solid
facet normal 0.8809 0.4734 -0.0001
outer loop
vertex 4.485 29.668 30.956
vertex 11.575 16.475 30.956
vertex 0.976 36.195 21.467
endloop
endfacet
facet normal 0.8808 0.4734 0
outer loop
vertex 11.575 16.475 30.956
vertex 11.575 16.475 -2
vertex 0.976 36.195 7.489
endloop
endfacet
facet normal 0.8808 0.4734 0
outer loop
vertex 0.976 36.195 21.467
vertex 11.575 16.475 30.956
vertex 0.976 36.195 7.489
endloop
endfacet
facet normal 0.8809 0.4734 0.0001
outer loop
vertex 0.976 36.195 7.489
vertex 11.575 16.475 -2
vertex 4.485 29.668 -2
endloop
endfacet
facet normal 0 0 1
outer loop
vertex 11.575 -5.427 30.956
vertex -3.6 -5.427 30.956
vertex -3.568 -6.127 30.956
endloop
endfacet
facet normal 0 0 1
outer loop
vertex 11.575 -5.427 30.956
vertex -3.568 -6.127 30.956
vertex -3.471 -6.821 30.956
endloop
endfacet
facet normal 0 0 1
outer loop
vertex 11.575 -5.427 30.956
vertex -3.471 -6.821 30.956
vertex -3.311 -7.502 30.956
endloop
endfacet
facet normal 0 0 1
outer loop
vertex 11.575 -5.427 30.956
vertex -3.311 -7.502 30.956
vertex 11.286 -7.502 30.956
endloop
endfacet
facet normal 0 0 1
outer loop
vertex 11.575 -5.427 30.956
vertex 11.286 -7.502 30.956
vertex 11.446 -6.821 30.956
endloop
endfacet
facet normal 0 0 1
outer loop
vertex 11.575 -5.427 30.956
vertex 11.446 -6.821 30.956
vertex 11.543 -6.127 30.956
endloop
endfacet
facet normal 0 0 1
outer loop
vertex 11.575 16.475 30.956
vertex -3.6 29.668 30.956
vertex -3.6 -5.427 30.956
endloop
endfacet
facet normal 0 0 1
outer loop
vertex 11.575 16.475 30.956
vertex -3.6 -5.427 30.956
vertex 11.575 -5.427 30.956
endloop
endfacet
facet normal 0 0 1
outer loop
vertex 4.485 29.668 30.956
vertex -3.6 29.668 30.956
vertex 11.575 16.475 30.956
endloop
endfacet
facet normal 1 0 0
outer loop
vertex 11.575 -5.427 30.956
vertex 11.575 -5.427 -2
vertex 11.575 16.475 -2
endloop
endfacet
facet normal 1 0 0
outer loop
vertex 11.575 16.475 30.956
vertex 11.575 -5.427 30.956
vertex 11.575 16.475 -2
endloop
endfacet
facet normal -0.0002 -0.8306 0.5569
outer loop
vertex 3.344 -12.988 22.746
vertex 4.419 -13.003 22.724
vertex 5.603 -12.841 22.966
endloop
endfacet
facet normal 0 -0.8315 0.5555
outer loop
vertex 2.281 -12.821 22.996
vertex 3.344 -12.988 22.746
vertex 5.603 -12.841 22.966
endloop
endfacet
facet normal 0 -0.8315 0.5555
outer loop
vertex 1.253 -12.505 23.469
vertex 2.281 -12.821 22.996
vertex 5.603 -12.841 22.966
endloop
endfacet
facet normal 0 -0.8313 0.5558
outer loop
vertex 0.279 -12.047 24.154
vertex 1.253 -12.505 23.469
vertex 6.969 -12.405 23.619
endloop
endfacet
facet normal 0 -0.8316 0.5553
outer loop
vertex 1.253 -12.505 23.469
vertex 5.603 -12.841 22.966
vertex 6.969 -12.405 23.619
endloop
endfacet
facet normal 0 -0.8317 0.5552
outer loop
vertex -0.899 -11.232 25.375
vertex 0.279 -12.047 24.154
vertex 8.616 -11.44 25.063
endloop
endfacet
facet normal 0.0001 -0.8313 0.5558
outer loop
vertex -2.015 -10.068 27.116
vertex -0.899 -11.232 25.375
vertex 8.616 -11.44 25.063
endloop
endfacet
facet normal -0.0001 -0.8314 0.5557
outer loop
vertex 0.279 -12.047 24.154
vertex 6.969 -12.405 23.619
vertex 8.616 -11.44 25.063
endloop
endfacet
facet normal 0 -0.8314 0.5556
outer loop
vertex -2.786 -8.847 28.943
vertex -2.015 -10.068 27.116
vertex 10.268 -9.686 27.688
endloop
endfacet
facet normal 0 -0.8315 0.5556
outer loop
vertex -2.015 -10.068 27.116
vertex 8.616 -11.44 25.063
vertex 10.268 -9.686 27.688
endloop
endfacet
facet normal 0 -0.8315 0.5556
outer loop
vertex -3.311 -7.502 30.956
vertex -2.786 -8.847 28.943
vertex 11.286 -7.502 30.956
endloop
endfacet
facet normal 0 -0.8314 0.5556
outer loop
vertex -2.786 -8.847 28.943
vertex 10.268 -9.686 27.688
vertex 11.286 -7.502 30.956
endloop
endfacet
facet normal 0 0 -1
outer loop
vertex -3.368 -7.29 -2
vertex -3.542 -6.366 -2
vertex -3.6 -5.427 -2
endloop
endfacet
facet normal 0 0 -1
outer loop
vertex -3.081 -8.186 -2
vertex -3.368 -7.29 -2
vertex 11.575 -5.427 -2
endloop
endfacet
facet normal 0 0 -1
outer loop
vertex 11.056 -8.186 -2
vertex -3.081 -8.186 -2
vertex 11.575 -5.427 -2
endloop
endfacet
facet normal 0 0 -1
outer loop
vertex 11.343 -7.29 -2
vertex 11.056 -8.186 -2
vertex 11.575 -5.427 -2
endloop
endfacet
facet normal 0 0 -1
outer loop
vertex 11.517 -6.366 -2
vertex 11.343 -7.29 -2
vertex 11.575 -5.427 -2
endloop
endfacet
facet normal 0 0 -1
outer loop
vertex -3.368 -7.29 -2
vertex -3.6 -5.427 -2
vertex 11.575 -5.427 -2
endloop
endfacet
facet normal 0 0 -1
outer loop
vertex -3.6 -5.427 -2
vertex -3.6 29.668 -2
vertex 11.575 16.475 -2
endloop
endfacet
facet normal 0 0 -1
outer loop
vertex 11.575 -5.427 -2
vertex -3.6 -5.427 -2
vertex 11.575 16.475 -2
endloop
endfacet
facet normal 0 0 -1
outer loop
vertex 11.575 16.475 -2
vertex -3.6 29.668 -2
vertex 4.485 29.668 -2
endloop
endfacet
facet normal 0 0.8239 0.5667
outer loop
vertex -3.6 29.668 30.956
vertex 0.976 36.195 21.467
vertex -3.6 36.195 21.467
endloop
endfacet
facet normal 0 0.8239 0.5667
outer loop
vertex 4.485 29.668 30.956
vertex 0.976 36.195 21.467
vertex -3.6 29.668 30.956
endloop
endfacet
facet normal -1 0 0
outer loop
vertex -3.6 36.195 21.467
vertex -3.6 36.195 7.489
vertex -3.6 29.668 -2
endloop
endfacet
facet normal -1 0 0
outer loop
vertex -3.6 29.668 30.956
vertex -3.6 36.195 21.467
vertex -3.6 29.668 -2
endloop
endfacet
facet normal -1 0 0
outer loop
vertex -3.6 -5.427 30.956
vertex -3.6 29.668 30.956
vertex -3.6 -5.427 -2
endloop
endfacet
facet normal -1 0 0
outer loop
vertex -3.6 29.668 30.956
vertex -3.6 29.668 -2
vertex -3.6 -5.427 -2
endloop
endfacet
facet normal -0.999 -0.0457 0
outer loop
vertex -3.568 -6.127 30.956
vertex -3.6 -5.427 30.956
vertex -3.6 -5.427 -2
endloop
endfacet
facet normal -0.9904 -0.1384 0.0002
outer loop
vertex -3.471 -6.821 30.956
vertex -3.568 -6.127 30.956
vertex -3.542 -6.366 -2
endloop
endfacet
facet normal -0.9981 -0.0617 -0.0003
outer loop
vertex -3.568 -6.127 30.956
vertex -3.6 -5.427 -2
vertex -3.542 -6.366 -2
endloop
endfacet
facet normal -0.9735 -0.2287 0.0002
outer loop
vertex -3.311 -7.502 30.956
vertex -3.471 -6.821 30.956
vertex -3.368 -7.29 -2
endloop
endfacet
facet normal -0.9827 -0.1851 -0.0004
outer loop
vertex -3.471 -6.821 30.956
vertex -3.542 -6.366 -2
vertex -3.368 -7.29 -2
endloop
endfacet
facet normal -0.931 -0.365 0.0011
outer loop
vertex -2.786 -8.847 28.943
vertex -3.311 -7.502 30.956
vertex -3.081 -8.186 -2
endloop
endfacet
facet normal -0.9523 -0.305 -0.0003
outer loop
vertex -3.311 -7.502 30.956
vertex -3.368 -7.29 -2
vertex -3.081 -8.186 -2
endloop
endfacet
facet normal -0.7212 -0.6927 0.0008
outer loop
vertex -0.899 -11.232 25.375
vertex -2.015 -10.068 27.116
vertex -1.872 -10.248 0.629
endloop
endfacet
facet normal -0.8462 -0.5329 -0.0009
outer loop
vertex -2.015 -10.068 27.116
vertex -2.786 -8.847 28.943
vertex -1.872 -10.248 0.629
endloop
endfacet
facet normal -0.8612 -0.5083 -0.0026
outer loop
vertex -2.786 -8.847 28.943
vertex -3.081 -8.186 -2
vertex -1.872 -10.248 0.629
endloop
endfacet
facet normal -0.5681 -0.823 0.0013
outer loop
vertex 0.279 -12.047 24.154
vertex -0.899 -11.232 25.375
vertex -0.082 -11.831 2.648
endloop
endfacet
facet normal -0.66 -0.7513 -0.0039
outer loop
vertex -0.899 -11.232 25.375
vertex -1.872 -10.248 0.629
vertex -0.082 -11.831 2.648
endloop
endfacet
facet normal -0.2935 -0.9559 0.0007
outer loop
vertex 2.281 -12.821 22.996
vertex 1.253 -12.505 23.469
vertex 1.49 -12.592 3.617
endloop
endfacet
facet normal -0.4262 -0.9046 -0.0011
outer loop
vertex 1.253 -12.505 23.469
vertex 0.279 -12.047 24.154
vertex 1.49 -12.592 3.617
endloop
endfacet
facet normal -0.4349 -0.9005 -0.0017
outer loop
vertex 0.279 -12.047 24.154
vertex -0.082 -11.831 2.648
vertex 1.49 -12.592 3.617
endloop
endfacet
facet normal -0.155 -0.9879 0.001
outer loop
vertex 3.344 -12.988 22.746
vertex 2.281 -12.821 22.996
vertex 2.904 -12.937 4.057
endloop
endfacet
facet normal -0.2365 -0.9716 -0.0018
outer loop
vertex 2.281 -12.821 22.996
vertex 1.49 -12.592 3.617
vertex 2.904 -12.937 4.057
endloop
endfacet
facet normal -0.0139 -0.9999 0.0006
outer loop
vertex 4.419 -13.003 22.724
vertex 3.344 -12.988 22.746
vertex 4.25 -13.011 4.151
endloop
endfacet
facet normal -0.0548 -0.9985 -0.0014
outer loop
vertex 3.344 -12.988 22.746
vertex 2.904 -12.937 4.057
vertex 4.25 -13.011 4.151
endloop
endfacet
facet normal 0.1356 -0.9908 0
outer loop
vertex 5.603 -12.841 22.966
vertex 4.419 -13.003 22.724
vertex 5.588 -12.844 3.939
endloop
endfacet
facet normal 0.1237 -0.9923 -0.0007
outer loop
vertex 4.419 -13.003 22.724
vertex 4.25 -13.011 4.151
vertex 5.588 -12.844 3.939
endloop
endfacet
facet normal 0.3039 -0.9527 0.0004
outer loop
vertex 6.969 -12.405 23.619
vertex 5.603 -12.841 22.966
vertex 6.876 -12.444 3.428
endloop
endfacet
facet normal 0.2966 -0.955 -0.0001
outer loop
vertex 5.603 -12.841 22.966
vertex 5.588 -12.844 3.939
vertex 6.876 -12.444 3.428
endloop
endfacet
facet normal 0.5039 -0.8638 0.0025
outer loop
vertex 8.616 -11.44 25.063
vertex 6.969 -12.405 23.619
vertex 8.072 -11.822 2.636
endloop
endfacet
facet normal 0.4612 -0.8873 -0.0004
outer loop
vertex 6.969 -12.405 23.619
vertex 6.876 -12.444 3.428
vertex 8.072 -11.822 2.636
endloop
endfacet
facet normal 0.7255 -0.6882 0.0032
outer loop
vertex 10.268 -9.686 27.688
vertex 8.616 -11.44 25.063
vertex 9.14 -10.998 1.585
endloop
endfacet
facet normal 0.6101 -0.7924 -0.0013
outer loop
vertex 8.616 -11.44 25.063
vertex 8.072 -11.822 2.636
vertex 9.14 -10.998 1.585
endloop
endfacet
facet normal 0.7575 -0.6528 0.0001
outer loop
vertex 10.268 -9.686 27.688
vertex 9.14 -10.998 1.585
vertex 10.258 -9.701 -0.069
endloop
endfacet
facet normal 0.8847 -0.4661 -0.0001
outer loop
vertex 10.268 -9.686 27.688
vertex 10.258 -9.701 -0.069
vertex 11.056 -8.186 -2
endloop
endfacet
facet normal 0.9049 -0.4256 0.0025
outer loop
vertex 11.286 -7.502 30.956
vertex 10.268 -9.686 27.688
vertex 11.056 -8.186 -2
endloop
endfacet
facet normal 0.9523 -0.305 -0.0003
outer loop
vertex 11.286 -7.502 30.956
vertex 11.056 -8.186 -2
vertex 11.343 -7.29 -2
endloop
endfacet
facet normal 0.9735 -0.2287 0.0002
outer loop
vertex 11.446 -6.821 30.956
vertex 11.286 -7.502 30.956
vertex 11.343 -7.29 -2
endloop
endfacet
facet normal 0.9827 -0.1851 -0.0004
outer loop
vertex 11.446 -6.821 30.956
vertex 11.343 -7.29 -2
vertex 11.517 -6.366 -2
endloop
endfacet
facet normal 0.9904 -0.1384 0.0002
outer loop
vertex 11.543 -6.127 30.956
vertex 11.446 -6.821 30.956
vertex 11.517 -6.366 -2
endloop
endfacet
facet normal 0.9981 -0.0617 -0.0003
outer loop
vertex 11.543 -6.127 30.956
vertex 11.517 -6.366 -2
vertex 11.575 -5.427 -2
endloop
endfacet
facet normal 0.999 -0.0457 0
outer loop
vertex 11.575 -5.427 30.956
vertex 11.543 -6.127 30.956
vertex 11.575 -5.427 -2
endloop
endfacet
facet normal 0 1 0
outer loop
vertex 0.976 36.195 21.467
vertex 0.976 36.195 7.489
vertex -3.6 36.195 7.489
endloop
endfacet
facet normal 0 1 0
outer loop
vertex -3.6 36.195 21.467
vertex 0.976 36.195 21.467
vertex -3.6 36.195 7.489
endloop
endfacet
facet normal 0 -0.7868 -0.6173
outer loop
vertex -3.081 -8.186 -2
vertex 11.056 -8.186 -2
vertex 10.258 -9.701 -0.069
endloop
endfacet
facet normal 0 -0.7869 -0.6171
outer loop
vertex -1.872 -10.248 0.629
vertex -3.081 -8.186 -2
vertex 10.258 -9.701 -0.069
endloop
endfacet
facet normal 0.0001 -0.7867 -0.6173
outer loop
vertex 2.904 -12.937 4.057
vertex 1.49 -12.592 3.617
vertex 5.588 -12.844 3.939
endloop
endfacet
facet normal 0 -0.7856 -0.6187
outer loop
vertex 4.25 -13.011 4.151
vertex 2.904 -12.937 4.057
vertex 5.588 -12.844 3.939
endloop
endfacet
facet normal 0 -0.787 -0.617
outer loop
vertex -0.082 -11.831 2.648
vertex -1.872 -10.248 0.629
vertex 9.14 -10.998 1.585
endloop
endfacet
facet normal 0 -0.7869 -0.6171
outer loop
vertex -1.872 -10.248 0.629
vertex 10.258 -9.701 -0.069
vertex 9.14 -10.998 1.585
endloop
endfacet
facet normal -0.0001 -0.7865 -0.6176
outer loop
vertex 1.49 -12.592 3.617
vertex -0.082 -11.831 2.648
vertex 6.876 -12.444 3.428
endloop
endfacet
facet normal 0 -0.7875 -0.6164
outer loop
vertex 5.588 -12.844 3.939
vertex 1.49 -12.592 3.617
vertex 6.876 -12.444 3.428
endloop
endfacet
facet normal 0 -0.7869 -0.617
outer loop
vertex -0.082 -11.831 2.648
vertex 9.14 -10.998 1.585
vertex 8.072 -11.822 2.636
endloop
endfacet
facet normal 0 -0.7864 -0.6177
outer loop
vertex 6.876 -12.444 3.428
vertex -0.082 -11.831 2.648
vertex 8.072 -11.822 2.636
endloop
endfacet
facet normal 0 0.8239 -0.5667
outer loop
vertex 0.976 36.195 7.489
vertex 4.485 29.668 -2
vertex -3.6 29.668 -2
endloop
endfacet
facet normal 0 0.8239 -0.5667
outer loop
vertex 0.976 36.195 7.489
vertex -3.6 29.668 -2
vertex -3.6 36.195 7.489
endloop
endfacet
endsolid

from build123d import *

# Parameters (mm, degrees)
BOSS_EXTRUDE1_DEPTH      = 30.956
BOSS_EXTRUDE1_DEPTH_BACK = 2
CUT_EXTRUDE1_DEPTH       = 50.013690395
CUT_EXTRUDE1_DEPTH_BACK  = 50.013690395


with BuildPart() as part:
    # Sketch1 → Boss-Extrude1 (new, two sides: drawn at the far end of the back side and taken through both)
    with BuildSketch(Plane.XY.offset(-BOSS_EXTRUDE1_DEPTH_BACK)):
        with BuildLine():
            Line((-3.6, 36.195), (-3.6, -5.427367667))
            ThreePointArc((-3.6, -5.427367667), (3.9877, -13.015067667), (11.5754, -5.427367667))
            Line((11.5754, -5.427367667), (11.5754, 16.475329119))
            Line((11.5754, 16.475329119), (0.976429971, 36.195))
            Line((0.976429971, 36.195), (-3.6, 36.195))
        make_face()
    extrude(amount=BOSS_EXTRUDE1_DEPTH + BOSS_EXTRUDE1_DEPTH_BACK)

    # Sketch2 → Cut-Extrude1 (cut, two sides: drawn at the far end of the back side and taken through both)
    with BuildSketch(Plane.ZY.offset(-CUT_EXTRUDE1_DEPTH_BACK)):
        Polygon((-2, 29.667962996), (7.4890837, 36.195), (21.4669163, 36.195), (30.956, 29.667962996), (30.956, 40.573926282), (-2, 40.573926282), align=None)
        Polygon((-6.302377798, -4.81069075), (9.259609163, -17.017997888), (16.714453216, -17.017997888), (37.494831014, -3.133350838), (37.494831014, -21.39692417), (-6.302377798, -21.39692417), align=None)
    extrude(amount=CUT_EXTRUDE1_DEPTH + CUT_EXTRUDE1_DEPTH_BACK, mode=Mode.SUBTRACT)


solid = part.part
